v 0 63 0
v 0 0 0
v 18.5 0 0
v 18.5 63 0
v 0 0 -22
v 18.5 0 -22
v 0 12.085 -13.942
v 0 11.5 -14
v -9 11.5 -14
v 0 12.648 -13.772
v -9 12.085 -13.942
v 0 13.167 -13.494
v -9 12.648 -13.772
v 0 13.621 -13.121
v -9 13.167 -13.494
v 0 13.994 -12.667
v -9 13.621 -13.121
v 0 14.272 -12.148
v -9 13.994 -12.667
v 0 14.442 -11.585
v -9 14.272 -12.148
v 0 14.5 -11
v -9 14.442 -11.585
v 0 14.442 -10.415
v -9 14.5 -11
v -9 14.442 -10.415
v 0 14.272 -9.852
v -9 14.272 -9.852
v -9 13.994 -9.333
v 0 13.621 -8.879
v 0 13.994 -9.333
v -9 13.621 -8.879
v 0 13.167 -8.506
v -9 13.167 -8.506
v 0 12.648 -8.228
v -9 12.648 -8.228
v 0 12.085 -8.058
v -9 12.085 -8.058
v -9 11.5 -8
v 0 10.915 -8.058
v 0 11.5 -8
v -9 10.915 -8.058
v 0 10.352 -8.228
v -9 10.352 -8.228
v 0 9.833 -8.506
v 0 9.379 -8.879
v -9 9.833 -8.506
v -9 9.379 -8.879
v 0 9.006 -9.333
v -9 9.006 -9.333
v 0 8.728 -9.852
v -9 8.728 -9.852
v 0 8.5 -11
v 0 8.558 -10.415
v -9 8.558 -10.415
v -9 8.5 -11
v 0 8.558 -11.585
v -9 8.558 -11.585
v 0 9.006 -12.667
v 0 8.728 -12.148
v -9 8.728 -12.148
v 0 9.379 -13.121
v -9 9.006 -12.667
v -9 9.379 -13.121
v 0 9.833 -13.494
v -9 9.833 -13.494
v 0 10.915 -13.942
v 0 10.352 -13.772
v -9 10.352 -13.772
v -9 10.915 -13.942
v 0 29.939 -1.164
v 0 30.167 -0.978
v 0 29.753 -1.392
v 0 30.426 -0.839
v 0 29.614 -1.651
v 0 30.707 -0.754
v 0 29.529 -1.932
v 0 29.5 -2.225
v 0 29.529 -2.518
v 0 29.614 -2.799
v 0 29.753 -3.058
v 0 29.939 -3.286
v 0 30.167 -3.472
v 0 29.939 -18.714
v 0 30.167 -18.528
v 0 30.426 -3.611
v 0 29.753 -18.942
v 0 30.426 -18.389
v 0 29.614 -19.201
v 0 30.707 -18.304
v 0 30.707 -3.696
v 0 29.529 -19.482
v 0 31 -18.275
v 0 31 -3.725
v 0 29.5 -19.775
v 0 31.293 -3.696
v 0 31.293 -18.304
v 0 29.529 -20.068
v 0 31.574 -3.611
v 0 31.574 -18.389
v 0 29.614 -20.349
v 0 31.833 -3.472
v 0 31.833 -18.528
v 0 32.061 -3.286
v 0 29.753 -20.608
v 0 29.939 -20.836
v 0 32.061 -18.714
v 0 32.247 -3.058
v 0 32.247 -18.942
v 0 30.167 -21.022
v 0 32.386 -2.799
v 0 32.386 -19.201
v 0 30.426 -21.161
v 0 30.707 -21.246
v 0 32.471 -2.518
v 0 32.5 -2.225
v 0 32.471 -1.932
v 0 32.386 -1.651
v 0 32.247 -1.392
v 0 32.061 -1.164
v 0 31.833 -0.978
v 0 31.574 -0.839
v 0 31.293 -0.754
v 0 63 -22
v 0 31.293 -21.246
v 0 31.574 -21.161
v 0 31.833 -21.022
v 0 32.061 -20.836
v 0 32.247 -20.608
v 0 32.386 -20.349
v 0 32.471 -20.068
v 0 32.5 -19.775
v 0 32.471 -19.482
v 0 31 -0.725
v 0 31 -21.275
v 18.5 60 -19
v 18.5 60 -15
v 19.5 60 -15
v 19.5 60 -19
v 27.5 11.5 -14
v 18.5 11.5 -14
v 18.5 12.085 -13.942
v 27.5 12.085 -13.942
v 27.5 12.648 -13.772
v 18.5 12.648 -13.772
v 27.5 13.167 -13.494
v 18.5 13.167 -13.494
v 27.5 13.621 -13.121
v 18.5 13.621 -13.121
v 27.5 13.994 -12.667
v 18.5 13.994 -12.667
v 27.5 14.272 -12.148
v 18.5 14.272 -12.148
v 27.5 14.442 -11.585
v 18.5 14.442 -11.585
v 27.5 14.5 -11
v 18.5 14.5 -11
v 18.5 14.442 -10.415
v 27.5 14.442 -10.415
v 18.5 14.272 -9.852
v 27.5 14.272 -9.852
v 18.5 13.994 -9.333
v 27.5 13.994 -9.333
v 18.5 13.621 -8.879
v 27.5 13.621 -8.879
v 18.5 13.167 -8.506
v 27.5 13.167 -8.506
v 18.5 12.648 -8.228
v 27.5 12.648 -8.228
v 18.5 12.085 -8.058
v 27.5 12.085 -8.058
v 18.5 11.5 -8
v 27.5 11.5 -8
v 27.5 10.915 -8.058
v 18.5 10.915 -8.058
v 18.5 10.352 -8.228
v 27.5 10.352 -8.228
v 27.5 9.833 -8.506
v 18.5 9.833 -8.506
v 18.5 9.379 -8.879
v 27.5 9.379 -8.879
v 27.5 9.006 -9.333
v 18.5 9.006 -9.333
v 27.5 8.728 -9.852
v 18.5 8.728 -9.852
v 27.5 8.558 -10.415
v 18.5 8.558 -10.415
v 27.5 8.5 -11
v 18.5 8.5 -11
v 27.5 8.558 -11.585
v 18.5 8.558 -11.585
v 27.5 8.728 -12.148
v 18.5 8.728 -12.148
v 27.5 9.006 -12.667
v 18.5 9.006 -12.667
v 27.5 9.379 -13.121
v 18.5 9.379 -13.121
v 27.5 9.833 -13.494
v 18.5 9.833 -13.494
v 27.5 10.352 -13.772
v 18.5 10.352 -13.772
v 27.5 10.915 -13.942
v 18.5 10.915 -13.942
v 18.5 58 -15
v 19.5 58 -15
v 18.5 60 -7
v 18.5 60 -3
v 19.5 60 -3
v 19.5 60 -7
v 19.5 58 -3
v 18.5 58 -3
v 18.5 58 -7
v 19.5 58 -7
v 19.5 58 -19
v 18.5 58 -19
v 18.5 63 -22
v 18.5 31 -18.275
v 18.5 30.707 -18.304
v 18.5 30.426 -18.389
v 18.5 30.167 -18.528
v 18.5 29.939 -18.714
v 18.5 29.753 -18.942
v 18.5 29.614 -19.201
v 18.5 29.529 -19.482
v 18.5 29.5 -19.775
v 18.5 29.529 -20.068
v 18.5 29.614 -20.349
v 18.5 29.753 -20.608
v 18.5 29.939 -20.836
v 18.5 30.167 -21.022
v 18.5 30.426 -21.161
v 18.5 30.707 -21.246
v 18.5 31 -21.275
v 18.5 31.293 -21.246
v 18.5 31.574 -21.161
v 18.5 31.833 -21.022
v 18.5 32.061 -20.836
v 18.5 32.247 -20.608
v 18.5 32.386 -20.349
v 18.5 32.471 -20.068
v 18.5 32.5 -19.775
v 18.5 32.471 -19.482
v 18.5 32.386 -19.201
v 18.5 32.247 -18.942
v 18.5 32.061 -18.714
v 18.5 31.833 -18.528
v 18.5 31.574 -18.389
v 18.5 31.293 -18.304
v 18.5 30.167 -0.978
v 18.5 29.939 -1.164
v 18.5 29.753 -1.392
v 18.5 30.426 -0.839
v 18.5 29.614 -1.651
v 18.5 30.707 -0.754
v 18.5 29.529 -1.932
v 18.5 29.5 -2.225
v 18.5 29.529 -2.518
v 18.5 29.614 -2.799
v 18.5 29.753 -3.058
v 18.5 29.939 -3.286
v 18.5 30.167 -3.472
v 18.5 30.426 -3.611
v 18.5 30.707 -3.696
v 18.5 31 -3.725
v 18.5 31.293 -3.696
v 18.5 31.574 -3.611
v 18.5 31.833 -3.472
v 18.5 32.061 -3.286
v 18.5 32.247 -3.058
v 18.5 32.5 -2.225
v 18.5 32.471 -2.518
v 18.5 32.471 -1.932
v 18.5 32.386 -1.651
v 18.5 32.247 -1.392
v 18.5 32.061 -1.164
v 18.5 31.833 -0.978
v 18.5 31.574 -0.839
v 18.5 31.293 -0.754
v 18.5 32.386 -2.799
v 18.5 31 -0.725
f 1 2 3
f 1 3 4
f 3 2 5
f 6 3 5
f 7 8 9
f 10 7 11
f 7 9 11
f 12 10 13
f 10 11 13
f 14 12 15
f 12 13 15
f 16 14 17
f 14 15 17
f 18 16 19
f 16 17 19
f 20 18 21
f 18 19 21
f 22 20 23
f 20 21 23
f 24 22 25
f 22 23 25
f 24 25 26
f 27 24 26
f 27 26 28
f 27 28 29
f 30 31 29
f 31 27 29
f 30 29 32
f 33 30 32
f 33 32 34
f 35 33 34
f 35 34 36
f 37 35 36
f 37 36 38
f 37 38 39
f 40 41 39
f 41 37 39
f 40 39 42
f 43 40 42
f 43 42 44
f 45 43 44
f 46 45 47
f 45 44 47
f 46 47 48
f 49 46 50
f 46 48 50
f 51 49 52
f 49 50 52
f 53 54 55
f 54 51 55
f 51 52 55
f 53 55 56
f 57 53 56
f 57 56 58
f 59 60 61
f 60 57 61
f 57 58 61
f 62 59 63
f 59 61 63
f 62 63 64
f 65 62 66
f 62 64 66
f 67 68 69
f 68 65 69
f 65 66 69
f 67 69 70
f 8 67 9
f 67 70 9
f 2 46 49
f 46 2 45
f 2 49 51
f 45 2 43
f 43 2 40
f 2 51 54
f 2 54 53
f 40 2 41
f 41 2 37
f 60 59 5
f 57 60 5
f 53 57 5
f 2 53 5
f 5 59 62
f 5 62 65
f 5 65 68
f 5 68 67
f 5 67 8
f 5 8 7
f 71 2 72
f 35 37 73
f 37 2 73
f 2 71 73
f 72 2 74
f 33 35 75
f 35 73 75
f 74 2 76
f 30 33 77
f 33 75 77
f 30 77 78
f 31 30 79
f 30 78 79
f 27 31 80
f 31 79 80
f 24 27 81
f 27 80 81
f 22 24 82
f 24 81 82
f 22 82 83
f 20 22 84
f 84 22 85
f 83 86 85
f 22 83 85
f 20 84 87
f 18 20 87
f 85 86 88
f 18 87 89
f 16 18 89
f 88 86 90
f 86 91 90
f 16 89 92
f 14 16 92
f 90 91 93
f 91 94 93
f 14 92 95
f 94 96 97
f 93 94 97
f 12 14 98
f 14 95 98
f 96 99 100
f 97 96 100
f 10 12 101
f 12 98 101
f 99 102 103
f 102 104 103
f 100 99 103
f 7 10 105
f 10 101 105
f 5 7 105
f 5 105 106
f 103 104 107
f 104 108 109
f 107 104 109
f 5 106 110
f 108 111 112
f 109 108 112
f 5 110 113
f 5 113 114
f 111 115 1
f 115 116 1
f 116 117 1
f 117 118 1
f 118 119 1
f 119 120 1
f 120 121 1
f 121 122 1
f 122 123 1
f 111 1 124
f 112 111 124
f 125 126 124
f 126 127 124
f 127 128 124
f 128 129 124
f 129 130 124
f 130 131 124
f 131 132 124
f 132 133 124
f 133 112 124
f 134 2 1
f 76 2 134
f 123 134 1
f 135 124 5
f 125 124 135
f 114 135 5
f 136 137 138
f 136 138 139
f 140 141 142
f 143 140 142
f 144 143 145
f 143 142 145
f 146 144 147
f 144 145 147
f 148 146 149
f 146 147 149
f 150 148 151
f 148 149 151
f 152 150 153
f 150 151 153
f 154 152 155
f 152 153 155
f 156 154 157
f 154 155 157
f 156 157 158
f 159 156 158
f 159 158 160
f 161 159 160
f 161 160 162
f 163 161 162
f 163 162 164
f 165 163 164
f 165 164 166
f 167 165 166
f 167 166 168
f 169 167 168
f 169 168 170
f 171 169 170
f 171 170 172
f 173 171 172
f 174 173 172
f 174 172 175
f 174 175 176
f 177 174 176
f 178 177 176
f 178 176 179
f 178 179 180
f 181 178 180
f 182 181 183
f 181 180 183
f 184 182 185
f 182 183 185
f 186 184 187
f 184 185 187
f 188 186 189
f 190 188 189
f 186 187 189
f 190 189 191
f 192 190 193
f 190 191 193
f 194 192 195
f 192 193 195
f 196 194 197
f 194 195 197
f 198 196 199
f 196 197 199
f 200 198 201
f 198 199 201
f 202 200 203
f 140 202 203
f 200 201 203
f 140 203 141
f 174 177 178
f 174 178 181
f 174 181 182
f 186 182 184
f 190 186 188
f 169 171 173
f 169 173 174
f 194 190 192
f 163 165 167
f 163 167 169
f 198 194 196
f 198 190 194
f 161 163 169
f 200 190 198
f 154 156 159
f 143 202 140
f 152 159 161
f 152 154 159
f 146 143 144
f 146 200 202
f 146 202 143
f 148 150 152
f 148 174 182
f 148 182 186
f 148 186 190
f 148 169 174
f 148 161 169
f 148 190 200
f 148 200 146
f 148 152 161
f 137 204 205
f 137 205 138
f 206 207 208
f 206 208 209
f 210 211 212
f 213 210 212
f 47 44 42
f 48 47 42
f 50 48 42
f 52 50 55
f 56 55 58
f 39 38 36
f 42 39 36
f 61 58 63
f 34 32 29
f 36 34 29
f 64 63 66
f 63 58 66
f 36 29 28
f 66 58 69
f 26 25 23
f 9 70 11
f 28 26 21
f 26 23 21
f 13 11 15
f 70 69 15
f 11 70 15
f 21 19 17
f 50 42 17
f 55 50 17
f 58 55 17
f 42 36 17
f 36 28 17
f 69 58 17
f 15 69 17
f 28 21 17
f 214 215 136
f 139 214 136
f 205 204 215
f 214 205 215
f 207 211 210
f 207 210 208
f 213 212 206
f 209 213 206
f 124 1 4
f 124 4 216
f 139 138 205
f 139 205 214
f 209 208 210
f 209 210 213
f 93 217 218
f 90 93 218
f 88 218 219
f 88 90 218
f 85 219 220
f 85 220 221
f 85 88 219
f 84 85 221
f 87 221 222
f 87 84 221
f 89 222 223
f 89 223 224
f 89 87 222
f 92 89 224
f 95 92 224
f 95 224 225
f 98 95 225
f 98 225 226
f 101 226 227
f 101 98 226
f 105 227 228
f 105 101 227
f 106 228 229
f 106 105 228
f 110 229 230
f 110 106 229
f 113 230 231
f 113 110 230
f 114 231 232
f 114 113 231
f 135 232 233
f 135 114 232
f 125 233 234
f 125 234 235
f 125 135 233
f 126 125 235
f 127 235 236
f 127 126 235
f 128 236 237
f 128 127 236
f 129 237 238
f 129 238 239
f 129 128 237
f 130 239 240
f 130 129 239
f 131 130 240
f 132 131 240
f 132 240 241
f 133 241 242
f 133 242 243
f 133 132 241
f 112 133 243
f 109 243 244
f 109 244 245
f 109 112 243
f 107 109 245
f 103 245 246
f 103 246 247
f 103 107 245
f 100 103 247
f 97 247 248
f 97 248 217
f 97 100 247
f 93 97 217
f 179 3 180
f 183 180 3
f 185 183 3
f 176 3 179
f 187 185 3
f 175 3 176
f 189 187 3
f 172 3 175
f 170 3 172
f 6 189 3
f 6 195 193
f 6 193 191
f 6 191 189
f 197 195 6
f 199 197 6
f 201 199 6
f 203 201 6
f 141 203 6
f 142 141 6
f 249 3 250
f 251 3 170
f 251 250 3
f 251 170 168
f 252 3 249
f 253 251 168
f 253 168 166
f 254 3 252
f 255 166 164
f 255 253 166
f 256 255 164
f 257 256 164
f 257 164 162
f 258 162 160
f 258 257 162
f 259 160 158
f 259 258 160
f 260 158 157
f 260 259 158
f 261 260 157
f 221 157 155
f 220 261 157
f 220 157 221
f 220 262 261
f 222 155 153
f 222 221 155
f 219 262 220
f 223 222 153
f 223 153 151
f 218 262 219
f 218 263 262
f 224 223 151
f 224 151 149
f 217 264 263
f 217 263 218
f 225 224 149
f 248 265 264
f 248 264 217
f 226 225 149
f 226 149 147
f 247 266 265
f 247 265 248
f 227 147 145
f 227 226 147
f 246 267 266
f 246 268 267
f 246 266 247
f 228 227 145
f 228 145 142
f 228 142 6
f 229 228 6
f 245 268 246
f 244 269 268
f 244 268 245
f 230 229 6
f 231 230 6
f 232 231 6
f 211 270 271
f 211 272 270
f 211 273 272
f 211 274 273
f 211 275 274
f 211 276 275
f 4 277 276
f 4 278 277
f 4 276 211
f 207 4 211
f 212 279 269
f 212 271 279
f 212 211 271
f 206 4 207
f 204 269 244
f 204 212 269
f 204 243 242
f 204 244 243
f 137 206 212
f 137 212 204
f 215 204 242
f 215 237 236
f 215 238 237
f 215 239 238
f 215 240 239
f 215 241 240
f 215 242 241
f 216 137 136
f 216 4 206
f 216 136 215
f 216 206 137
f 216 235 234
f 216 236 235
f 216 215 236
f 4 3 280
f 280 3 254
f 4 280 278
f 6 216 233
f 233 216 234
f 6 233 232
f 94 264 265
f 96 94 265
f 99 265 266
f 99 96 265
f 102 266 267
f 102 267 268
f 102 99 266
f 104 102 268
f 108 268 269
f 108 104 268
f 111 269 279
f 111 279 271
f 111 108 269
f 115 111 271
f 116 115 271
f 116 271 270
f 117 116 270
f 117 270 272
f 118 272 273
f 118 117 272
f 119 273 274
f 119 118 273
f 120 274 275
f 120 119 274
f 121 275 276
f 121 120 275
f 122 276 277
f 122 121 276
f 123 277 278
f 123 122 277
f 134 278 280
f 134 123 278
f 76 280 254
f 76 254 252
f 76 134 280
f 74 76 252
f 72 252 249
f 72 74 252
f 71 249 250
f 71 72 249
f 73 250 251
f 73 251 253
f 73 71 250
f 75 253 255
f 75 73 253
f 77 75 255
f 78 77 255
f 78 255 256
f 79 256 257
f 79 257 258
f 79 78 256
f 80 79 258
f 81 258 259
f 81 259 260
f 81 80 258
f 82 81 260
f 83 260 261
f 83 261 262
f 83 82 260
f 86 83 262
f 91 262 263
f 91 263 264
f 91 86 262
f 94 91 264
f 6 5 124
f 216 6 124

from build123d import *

# Parameters (mm, degrees)
ESQUISSE1_W             = 22
ESQUISSE1_H             = 63
ESQUISSE1_R             = 1.5
BOSS_EXTRU_1_DEPTH      = 18.5
BOSS_EXTRU_2_DEPTH      = 9
BOSS_EXTRU_2_DEPTH_BACK = 27.5
ESQUISSE2_R             = 3
ESQUISSE3_W             = 4
ESQUISSE3_H             = 2
BOSS_EXTRU_3_DEPTH      = 1


with BuildPart() as part:
    # Esquisse1 → Boss.-Extru.1 (new body)
    with BuildSketch(Plane(origin=(0, 0, 0), x_dir=(0, 0, -1), z_dir=(1, 0, 0))):
        with Locations((11, 31.5)):
            Rectangle(ESQUISSE1_W, ESQUISSE1_H)
        with Locations((2.225, 31)):
            Circle(ESQUISSE1_R, mode=Mode.SUBTRACT)
        with Locations(Location((19.775, 31, 0), (0, 0, 180))):
            Circle(ESQUISSE1_R, mode=Mode.SUBTRACT)
    extrude(amount=BOSS_EXTRU_1_DEPTH)

    # Esquisse2 → Boss.-Extru.2 (add, two sides: drawn at the far end of the back side and taken through both)
    with BuildSketch(Plane(origin=(18.5, 0, 0), x_dir=(0, 0, -1), z_dir=(1, 0, 0)).offset(-BOSS_EXTRU_2_DEPTH_BACK)):
        with Locations((11, 11.5)):
            Circle(ESQUISSE2_R)
    extrude(amount=BOSS_EXTRU_2_DEPTH + BOSS_EXTRU_2_DEPTH_BACK)

    # Esquisse3 → Boss.-Extru.3 (add)
    with BuildSketch(Plane(origin=(18.5, 0, 0), x_dir=(0, 0, -1), z_dir=(1, 0, 0))):
        with Locations((5, 59)):
            Rectangle(ESQUISSE3_W, ESQUISSE3_H)
        with Locations((17, 59)):
            Rectangle(ESQUISSE3_W, ESQUISSE3_H)
    extrude(amount=BOSS_EXTRU_3_DEPTH)


solid = part.part
